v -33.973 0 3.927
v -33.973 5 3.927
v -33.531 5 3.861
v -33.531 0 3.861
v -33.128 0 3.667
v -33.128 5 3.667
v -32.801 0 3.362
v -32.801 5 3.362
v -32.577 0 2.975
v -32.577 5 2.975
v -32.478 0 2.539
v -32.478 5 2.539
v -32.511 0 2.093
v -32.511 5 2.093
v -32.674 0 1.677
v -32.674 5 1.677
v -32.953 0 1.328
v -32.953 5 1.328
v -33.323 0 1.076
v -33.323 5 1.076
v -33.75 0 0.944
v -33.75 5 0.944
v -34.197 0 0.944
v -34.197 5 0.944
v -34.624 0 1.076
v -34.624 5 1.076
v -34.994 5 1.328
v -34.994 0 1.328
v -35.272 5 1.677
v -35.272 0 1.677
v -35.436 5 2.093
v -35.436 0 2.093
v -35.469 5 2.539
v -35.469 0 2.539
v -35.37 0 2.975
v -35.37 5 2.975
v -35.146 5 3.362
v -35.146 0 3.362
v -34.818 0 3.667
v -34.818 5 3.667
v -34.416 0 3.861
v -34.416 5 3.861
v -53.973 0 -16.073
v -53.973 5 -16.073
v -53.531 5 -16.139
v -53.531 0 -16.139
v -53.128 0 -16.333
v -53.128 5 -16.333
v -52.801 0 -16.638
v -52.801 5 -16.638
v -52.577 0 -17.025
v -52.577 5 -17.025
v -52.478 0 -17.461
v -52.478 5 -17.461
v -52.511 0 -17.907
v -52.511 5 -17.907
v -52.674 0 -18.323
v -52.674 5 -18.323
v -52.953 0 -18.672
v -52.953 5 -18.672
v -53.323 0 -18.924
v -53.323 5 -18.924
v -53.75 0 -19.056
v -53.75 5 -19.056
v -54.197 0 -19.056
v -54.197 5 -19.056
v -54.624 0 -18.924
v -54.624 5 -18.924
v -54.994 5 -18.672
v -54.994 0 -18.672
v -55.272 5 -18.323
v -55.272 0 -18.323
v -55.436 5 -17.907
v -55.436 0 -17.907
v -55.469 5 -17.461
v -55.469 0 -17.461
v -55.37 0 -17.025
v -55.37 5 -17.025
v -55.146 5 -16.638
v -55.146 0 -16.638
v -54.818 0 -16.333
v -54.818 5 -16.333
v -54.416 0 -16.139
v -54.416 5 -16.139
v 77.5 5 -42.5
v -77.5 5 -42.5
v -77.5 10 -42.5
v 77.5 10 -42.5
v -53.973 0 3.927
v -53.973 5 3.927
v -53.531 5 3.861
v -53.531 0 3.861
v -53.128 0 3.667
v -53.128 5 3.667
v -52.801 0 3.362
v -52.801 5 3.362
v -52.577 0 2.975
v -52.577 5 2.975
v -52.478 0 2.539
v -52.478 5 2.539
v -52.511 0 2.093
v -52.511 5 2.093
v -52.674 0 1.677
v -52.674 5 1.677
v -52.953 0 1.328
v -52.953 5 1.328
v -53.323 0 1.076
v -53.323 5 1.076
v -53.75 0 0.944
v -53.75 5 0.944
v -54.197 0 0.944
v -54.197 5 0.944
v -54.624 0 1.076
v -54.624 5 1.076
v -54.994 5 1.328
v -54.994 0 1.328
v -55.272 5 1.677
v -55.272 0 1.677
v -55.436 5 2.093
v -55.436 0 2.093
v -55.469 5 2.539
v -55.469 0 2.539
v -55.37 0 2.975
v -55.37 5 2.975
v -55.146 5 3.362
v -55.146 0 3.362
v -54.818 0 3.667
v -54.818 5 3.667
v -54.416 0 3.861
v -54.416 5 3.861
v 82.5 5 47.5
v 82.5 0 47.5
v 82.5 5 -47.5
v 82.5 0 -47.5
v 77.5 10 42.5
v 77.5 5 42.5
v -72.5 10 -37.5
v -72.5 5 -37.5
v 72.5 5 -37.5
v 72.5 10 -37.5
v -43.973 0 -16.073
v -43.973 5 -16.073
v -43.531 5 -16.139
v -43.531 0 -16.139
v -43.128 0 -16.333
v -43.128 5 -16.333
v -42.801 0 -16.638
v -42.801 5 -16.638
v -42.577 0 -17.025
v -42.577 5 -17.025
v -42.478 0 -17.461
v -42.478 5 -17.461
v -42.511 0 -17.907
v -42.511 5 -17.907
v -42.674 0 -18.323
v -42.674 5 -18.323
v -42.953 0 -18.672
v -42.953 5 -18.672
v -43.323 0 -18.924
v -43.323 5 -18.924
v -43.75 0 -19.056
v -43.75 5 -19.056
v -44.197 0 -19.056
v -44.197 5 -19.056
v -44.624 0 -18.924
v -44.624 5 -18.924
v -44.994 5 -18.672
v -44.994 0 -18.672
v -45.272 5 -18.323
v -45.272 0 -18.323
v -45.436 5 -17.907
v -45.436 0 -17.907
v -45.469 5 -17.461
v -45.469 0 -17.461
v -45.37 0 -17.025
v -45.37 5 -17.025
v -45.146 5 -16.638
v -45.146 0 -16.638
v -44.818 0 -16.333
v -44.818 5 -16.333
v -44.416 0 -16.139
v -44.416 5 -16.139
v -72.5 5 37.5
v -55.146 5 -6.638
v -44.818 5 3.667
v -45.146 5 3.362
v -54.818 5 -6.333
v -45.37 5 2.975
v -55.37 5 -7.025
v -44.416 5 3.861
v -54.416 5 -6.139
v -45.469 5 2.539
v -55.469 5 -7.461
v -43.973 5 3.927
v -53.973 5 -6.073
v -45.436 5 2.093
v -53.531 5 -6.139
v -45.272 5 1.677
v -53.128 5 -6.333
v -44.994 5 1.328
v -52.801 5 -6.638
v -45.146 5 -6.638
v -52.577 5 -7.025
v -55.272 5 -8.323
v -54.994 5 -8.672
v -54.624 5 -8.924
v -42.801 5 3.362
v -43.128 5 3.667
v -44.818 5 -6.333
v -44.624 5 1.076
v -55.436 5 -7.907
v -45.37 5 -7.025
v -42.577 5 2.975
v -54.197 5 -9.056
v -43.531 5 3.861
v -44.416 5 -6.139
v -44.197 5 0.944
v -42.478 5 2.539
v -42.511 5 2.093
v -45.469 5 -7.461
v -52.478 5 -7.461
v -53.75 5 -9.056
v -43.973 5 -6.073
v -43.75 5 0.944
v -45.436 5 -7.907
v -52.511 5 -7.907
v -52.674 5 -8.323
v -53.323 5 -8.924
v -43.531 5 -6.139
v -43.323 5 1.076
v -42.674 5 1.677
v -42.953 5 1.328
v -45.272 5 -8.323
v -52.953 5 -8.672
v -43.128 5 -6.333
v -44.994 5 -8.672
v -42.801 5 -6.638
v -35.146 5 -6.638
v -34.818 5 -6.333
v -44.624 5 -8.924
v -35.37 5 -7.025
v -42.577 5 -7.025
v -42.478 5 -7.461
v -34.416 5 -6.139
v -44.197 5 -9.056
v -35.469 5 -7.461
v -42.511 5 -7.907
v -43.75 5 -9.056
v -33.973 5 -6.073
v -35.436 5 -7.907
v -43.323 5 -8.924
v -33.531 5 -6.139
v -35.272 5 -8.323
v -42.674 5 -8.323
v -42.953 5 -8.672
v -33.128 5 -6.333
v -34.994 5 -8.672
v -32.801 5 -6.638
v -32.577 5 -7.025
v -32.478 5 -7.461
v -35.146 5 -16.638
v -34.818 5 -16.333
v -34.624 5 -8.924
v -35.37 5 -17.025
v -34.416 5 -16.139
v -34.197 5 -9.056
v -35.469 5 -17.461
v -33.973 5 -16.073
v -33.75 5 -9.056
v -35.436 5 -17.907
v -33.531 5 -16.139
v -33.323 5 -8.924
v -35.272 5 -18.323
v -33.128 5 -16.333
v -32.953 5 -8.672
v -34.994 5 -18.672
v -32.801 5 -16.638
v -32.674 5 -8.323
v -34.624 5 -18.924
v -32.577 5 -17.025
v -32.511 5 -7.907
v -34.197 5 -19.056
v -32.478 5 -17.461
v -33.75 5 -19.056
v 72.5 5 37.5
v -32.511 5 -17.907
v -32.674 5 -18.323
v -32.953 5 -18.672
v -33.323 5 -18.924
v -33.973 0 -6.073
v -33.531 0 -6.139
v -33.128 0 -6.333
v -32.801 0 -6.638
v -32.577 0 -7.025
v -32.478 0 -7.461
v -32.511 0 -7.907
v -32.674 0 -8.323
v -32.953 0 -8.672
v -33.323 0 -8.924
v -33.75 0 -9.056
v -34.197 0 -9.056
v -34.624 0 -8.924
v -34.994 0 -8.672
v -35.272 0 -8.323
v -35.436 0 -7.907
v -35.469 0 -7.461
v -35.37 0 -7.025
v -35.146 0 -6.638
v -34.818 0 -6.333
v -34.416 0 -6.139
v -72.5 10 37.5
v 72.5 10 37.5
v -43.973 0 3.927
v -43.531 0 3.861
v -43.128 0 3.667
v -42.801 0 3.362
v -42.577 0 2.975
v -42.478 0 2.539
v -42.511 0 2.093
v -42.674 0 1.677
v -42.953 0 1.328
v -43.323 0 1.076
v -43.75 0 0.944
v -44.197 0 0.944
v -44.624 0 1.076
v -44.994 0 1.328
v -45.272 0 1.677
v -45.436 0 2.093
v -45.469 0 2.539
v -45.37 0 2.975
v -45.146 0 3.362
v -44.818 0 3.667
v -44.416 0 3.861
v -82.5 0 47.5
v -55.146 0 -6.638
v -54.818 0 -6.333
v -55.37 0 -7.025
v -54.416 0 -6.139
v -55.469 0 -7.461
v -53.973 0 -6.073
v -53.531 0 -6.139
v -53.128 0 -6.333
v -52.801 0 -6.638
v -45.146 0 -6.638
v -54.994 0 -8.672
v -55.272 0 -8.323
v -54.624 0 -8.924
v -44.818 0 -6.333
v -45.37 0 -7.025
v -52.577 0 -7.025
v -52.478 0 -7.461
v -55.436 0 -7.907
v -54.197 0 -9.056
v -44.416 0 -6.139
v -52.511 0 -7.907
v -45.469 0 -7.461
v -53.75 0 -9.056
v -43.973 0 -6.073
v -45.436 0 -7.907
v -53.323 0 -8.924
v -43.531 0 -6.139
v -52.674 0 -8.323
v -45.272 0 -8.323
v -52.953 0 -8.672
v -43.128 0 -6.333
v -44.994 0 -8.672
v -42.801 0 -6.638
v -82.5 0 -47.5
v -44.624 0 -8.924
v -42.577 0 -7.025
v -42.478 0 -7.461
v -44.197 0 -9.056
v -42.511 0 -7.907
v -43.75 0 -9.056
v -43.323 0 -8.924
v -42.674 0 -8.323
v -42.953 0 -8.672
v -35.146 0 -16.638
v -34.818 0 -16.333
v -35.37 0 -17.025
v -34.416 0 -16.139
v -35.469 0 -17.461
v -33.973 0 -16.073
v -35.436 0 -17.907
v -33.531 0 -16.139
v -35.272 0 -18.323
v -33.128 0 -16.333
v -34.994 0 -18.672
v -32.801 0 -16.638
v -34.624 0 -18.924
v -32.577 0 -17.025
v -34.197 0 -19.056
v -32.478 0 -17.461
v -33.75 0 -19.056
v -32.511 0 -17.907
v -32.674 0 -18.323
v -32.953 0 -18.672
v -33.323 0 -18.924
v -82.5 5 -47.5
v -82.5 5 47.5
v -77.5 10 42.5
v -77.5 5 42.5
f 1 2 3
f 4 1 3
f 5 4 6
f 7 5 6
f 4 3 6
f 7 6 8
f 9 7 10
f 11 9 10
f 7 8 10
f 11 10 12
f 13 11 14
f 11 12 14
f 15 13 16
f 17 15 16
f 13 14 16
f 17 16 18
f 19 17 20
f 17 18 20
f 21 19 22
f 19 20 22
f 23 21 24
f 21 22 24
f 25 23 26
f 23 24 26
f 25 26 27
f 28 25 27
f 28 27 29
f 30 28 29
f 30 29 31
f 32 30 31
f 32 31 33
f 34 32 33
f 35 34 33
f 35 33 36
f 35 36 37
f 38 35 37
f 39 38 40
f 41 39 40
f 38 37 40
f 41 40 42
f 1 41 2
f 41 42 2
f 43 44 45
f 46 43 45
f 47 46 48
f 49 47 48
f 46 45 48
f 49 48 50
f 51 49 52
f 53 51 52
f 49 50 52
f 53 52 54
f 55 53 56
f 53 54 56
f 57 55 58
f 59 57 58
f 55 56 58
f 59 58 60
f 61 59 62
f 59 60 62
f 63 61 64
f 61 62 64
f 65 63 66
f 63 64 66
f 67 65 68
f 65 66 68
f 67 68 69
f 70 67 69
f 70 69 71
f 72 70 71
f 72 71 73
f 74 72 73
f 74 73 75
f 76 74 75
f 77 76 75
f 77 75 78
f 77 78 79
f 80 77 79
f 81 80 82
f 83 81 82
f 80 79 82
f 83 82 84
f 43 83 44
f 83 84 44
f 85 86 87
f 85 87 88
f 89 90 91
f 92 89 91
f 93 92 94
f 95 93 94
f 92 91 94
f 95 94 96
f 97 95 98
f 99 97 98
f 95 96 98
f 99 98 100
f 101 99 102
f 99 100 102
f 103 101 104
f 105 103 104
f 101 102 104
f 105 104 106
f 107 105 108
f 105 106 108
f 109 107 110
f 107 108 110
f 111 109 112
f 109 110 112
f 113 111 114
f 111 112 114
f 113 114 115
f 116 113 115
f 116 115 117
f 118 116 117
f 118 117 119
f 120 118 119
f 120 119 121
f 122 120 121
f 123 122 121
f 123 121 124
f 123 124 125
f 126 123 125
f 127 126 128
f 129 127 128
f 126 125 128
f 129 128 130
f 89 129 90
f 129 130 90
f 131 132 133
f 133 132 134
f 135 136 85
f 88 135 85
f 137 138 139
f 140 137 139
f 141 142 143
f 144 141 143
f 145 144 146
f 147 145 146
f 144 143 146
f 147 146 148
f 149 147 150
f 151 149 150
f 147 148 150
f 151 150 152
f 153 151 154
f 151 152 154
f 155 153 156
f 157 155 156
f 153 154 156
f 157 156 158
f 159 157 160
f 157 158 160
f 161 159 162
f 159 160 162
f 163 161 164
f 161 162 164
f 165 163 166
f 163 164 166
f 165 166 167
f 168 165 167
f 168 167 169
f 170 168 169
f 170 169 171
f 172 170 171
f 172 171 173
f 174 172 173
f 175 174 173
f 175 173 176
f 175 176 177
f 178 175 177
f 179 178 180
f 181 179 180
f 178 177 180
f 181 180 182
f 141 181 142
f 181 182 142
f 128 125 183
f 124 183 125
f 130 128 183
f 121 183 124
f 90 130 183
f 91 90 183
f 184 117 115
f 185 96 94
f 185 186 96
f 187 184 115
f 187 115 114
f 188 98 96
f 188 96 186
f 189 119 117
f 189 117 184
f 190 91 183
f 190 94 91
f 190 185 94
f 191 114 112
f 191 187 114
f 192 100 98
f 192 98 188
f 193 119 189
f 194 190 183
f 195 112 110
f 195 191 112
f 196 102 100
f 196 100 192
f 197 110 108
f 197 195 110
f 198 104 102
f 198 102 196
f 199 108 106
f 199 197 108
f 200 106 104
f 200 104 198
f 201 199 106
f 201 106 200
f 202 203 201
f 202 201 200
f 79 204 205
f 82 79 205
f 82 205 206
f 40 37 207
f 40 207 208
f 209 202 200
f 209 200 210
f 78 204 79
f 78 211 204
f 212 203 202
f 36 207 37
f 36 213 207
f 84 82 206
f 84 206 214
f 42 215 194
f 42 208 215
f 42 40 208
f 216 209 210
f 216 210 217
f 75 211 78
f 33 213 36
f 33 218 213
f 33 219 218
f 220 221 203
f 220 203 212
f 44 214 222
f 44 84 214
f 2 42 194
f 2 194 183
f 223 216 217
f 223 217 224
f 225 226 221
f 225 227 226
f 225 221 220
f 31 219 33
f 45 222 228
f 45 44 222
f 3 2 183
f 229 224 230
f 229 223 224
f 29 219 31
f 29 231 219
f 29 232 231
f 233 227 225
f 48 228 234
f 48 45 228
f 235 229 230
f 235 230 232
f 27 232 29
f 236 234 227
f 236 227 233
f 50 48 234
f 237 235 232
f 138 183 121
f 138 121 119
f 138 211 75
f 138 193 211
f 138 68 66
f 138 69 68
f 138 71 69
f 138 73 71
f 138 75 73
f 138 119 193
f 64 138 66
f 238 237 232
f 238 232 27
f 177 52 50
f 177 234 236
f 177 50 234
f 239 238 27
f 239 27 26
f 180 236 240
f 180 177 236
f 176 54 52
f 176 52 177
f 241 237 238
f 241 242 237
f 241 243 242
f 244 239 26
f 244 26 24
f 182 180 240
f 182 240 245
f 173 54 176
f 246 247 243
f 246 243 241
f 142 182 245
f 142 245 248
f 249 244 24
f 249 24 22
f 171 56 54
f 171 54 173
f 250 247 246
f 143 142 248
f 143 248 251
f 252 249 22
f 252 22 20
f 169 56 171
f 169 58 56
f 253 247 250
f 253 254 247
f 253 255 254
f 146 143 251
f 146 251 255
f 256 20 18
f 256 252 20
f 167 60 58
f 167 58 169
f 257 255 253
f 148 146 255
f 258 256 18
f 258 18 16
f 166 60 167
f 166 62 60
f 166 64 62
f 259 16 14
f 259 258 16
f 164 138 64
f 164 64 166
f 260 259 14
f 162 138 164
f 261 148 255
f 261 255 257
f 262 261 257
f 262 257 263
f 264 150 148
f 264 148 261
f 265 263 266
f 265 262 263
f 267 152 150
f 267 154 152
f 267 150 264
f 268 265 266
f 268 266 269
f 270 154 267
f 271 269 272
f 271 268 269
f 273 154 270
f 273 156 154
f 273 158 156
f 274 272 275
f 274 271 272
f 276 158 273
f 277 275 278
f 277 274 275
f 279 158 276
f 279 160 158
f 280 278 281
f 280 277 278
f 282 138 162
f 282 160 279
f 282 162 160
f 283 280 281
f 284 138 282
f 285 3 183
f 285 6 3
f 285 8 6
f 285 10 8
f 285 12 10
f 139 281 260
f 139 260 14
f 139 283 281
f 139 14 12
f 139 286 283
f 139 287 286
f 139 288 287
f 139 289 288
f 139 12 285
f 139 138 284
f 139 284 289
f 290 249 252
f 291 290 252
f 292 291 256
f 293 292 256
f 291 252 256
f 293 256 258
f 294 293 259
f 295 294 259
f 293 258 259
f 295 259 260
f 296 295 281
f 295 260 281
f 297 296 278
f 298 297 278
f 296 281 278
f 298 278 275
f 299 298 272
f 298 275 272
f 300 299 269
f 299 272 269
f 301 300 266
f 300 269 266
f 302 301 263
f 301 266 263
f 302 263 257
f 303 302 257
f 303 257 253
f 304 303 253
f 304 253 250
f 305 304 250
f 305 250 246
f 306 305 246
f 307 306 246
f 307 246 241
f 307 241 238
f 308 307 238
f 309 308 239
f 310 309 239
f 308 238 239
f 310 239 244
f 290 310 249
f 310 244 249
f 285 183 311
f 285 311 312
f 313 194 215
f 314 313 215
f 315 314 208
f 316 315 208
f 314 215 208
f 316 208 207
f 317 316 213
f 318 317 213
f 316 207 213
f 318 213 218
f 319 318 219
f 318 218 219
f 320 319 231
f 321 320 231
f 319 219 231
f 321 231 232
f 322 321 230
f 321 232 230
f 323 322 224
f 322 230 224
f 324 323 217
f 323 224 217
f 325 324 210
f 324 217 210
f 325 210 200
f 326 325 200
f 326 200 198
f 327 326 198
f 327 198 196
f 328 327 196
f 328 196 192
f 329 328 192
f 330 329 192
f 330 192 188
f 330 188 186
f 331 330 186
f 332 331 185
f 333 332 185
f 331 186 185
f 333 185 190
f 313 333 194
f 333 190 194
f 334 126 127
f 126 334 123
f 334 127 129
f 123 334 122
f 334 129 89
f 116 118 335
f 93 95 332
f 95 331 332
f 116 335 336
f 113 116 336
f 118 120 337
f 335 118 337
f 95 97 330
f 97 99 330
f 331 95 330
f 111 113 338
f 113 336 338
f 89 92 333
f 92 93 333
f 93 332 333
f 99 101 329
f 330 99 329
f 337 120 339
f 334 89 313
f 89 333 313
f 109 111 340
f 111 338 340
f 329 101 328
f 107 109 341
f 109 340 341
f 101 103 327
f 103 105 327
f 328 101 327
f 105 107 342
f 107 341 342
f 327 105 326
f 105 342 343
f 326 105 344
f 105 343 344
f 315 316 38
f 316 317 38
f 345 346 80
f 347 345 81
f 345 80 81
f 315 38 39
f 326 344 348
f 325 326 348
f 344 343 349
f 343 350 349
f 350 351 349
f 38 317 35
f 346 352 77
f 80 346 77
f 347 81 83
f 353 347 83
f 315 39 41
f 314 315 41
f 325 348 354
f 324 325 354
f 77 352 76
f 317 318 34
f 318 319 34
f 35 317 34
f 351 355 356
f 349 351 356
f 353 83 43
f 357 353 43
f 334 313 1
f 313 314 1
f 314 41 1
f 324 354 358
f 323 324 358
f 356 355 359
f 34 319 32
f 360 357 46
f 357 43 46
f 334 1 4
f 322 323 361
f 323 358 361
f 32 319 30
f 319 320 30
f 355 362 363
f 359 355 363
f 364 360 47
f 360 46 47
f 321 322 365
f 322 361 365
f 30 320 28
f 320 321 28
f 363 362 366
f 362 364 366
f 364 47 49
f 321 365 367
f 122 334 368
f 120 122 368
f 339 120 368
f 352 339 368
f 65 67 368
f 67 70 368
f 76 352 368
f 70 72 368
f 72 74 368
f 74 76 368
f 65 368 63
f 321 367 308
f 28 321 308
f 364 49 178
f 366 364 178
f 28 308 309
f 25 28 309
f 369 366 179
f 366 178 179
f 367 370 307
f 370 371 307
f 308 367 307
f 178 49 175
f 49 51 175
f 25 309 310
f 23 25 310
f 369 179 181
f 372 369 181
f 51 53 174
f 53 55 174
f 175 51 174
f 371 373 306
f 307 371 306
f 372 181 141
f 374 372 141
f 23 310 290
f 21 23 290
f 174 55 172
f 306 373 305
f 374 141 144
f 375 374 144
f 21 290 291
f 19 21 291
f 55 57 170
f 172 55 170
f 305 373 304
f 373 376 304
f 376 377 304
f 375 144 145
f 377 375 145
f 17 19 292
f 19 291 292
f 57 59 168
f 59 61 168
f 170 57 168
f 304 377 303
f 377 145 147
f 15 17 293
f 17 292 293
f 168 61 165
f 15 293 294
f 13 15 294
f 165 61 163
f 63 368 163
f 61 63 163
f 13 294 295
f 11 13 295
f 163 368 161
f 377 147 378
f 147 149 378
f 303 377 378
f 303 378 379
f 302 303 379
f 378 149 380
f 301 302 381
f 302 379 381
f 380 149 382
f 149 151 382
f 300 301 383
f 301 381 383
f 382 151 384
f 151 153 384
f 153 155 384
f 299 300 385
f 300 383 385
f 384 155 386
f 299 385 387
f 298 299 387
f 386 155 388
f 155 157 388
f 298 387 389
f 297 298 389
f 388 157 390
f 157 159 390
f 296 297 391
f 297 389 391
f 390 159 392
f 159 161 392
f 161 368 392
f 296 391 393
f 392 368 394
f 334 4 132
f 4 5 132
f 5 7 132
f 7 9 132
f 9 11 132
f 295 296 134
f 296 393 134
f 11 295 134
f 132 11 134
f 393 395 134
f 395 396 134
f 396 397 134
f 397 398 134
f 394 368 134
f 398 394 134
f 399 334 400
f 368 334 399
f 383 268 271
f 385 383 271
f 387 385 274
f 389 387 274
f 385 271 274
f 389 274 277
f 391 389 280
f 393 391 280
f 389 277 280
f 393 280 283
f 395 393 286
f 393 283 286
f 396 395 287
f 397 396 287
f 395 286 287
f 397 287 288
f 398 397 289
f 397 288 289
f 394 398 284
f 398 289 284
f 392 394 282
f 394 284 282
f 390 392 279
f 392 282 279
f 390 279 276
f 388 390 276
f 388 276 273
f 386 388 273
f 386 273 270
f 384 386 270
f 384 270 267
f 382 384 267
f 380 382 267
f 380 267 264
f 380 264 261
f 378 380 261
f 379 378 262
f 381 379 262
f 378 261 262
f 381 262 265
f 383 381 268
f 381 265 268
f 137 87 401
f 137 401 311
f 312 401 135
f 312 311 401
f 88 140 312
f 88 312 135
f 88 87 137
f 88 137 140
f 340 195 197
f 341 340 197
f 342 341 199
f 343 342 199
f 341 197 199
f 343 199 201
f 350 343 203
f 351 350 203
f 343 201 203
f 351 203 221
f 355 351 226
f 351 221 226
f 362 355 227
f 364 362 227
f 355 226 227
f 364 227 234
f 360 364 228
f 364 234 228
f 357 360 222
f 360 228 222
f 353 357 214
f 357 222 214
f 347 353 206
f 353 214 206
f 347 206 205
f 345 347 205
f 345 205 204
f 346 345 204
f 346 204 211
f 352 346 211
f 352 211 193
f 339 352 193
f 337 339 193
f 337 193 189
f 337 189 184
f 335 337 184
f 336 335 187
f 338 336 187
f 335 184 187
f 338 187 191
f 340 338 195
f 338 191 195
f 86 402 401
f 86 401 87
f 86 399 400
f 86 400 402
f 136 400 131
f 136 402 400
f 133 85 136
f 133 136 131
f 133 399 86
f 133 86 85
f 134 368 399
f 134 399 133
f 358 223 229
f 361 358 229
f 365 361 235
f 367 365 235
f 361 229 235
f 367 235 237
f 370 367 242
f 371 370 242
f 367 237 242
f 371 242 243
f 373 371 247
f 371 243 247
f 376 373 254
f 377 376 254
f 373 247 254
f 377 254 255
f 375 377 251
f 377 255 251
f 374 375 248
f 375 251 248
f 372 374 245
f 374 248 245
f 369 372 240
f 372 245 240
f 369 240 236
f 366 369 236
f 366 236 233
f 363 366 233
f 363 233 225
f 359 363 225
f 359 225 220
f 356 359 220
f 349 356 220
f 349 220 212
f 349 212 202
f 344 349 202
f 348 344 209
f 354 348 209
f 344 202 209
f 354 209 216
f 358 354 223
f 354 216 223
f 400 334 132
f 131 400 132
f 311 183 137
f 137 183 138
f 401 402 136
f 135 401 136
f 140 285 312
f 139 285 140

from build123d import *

# Parameters (mm, degrees)
SKETCH1_W           = 165
SKETCH1_H           = 95
BOSS_EXTRUDE1_DEPTH = 5
SKETCH2_W           = 155
SKETCH2_H           = 85
SKETCH2_W_2         = 145
SKETCH2_H_2         = 75
BOSS_EXTRUDE2_DEPTH = 5
SKETCH3_R           = 1.5
CUT_EXTRUDE1_DEPTH  = 5


with BuildPart() as part:
    # Sketch1 → Boss-Extrude1 (new body)
    with BuildSketch(Plane(origin=(0, 0, 0), x_dir=(1, 0, 0), z_dir=(0, 1, 0))):
        Rectangle(SKETCH1_W, SKETCH1_H)
    extrude(amount=BOSS_EXTRUDE1_DEPTH)

    # Sketch2 → Boss-Extrude2 (add)
    with BuildSketch(Plane(origin=(0, 5, 0), x_dir=(1, 0, 0), z_dir=(0, 1, 0))):
        Rectangle(SKETCH2_W, SKETCH2_H)
        Rectangle(SKETCH2_W_2, SKETCH2_H_2, mode=Mode.SUBTRACT)
    extrude(amount=BOSS_EXTRUDE2_DEPTH)

    # Sketch3 → Cut-Extrude1 (cut)
    with BuildSketch(Plane(origin=(0, 5, 0), x_dir=(1, 0, 0), z_dir=(0, 1, 0))):
        with Locations(Location((-53.973401438, 17.572735352, 0), (0, 0, 270))):
            Circle(SKETCH3_R)
        with Locations(Location((-43.973401438, 17.572735352, 0), (0, 0, 270))):
            Circle(SKETCH3_R)
        with Locations(Location((-33.973401438, 17.572735352, 0), (0, 0, 270))):
            Circle(SKETCH3_R)
        with Locations(Location((-43.973401438, 7.572735352, 0), (0, 0, 270))):
            Circle(SKETCH3_R)
        with Locations(Location((-33.973401438, 7.572735352, 0), (0, 0, 270))):
            Circle(SKETCH3_R)
        with Locations(Location((-43.973401438, -2.427264648, 0), (0, 0, 270))):
            Circle(SKETCH3_R)
        with Locations(Location((-33.973401438, -2.427264648, 0), (0, 0, 270))):
            Circle(SKETCH3_R)
        with Locations(Location((-53.973401438, 7.572735352, 0), (0, 0, 270))):
            Circle(SKETCH3_R)
        with Locations(Location((-53.973401438, -2.427264648, 0), (0, 0, 270))):
            Circle(SKETCH3_R)
    extrude(amount=-CUT_EXTRUDE1_DEPTH, mode=Mode.SUBTRACT)


solid = part.part
